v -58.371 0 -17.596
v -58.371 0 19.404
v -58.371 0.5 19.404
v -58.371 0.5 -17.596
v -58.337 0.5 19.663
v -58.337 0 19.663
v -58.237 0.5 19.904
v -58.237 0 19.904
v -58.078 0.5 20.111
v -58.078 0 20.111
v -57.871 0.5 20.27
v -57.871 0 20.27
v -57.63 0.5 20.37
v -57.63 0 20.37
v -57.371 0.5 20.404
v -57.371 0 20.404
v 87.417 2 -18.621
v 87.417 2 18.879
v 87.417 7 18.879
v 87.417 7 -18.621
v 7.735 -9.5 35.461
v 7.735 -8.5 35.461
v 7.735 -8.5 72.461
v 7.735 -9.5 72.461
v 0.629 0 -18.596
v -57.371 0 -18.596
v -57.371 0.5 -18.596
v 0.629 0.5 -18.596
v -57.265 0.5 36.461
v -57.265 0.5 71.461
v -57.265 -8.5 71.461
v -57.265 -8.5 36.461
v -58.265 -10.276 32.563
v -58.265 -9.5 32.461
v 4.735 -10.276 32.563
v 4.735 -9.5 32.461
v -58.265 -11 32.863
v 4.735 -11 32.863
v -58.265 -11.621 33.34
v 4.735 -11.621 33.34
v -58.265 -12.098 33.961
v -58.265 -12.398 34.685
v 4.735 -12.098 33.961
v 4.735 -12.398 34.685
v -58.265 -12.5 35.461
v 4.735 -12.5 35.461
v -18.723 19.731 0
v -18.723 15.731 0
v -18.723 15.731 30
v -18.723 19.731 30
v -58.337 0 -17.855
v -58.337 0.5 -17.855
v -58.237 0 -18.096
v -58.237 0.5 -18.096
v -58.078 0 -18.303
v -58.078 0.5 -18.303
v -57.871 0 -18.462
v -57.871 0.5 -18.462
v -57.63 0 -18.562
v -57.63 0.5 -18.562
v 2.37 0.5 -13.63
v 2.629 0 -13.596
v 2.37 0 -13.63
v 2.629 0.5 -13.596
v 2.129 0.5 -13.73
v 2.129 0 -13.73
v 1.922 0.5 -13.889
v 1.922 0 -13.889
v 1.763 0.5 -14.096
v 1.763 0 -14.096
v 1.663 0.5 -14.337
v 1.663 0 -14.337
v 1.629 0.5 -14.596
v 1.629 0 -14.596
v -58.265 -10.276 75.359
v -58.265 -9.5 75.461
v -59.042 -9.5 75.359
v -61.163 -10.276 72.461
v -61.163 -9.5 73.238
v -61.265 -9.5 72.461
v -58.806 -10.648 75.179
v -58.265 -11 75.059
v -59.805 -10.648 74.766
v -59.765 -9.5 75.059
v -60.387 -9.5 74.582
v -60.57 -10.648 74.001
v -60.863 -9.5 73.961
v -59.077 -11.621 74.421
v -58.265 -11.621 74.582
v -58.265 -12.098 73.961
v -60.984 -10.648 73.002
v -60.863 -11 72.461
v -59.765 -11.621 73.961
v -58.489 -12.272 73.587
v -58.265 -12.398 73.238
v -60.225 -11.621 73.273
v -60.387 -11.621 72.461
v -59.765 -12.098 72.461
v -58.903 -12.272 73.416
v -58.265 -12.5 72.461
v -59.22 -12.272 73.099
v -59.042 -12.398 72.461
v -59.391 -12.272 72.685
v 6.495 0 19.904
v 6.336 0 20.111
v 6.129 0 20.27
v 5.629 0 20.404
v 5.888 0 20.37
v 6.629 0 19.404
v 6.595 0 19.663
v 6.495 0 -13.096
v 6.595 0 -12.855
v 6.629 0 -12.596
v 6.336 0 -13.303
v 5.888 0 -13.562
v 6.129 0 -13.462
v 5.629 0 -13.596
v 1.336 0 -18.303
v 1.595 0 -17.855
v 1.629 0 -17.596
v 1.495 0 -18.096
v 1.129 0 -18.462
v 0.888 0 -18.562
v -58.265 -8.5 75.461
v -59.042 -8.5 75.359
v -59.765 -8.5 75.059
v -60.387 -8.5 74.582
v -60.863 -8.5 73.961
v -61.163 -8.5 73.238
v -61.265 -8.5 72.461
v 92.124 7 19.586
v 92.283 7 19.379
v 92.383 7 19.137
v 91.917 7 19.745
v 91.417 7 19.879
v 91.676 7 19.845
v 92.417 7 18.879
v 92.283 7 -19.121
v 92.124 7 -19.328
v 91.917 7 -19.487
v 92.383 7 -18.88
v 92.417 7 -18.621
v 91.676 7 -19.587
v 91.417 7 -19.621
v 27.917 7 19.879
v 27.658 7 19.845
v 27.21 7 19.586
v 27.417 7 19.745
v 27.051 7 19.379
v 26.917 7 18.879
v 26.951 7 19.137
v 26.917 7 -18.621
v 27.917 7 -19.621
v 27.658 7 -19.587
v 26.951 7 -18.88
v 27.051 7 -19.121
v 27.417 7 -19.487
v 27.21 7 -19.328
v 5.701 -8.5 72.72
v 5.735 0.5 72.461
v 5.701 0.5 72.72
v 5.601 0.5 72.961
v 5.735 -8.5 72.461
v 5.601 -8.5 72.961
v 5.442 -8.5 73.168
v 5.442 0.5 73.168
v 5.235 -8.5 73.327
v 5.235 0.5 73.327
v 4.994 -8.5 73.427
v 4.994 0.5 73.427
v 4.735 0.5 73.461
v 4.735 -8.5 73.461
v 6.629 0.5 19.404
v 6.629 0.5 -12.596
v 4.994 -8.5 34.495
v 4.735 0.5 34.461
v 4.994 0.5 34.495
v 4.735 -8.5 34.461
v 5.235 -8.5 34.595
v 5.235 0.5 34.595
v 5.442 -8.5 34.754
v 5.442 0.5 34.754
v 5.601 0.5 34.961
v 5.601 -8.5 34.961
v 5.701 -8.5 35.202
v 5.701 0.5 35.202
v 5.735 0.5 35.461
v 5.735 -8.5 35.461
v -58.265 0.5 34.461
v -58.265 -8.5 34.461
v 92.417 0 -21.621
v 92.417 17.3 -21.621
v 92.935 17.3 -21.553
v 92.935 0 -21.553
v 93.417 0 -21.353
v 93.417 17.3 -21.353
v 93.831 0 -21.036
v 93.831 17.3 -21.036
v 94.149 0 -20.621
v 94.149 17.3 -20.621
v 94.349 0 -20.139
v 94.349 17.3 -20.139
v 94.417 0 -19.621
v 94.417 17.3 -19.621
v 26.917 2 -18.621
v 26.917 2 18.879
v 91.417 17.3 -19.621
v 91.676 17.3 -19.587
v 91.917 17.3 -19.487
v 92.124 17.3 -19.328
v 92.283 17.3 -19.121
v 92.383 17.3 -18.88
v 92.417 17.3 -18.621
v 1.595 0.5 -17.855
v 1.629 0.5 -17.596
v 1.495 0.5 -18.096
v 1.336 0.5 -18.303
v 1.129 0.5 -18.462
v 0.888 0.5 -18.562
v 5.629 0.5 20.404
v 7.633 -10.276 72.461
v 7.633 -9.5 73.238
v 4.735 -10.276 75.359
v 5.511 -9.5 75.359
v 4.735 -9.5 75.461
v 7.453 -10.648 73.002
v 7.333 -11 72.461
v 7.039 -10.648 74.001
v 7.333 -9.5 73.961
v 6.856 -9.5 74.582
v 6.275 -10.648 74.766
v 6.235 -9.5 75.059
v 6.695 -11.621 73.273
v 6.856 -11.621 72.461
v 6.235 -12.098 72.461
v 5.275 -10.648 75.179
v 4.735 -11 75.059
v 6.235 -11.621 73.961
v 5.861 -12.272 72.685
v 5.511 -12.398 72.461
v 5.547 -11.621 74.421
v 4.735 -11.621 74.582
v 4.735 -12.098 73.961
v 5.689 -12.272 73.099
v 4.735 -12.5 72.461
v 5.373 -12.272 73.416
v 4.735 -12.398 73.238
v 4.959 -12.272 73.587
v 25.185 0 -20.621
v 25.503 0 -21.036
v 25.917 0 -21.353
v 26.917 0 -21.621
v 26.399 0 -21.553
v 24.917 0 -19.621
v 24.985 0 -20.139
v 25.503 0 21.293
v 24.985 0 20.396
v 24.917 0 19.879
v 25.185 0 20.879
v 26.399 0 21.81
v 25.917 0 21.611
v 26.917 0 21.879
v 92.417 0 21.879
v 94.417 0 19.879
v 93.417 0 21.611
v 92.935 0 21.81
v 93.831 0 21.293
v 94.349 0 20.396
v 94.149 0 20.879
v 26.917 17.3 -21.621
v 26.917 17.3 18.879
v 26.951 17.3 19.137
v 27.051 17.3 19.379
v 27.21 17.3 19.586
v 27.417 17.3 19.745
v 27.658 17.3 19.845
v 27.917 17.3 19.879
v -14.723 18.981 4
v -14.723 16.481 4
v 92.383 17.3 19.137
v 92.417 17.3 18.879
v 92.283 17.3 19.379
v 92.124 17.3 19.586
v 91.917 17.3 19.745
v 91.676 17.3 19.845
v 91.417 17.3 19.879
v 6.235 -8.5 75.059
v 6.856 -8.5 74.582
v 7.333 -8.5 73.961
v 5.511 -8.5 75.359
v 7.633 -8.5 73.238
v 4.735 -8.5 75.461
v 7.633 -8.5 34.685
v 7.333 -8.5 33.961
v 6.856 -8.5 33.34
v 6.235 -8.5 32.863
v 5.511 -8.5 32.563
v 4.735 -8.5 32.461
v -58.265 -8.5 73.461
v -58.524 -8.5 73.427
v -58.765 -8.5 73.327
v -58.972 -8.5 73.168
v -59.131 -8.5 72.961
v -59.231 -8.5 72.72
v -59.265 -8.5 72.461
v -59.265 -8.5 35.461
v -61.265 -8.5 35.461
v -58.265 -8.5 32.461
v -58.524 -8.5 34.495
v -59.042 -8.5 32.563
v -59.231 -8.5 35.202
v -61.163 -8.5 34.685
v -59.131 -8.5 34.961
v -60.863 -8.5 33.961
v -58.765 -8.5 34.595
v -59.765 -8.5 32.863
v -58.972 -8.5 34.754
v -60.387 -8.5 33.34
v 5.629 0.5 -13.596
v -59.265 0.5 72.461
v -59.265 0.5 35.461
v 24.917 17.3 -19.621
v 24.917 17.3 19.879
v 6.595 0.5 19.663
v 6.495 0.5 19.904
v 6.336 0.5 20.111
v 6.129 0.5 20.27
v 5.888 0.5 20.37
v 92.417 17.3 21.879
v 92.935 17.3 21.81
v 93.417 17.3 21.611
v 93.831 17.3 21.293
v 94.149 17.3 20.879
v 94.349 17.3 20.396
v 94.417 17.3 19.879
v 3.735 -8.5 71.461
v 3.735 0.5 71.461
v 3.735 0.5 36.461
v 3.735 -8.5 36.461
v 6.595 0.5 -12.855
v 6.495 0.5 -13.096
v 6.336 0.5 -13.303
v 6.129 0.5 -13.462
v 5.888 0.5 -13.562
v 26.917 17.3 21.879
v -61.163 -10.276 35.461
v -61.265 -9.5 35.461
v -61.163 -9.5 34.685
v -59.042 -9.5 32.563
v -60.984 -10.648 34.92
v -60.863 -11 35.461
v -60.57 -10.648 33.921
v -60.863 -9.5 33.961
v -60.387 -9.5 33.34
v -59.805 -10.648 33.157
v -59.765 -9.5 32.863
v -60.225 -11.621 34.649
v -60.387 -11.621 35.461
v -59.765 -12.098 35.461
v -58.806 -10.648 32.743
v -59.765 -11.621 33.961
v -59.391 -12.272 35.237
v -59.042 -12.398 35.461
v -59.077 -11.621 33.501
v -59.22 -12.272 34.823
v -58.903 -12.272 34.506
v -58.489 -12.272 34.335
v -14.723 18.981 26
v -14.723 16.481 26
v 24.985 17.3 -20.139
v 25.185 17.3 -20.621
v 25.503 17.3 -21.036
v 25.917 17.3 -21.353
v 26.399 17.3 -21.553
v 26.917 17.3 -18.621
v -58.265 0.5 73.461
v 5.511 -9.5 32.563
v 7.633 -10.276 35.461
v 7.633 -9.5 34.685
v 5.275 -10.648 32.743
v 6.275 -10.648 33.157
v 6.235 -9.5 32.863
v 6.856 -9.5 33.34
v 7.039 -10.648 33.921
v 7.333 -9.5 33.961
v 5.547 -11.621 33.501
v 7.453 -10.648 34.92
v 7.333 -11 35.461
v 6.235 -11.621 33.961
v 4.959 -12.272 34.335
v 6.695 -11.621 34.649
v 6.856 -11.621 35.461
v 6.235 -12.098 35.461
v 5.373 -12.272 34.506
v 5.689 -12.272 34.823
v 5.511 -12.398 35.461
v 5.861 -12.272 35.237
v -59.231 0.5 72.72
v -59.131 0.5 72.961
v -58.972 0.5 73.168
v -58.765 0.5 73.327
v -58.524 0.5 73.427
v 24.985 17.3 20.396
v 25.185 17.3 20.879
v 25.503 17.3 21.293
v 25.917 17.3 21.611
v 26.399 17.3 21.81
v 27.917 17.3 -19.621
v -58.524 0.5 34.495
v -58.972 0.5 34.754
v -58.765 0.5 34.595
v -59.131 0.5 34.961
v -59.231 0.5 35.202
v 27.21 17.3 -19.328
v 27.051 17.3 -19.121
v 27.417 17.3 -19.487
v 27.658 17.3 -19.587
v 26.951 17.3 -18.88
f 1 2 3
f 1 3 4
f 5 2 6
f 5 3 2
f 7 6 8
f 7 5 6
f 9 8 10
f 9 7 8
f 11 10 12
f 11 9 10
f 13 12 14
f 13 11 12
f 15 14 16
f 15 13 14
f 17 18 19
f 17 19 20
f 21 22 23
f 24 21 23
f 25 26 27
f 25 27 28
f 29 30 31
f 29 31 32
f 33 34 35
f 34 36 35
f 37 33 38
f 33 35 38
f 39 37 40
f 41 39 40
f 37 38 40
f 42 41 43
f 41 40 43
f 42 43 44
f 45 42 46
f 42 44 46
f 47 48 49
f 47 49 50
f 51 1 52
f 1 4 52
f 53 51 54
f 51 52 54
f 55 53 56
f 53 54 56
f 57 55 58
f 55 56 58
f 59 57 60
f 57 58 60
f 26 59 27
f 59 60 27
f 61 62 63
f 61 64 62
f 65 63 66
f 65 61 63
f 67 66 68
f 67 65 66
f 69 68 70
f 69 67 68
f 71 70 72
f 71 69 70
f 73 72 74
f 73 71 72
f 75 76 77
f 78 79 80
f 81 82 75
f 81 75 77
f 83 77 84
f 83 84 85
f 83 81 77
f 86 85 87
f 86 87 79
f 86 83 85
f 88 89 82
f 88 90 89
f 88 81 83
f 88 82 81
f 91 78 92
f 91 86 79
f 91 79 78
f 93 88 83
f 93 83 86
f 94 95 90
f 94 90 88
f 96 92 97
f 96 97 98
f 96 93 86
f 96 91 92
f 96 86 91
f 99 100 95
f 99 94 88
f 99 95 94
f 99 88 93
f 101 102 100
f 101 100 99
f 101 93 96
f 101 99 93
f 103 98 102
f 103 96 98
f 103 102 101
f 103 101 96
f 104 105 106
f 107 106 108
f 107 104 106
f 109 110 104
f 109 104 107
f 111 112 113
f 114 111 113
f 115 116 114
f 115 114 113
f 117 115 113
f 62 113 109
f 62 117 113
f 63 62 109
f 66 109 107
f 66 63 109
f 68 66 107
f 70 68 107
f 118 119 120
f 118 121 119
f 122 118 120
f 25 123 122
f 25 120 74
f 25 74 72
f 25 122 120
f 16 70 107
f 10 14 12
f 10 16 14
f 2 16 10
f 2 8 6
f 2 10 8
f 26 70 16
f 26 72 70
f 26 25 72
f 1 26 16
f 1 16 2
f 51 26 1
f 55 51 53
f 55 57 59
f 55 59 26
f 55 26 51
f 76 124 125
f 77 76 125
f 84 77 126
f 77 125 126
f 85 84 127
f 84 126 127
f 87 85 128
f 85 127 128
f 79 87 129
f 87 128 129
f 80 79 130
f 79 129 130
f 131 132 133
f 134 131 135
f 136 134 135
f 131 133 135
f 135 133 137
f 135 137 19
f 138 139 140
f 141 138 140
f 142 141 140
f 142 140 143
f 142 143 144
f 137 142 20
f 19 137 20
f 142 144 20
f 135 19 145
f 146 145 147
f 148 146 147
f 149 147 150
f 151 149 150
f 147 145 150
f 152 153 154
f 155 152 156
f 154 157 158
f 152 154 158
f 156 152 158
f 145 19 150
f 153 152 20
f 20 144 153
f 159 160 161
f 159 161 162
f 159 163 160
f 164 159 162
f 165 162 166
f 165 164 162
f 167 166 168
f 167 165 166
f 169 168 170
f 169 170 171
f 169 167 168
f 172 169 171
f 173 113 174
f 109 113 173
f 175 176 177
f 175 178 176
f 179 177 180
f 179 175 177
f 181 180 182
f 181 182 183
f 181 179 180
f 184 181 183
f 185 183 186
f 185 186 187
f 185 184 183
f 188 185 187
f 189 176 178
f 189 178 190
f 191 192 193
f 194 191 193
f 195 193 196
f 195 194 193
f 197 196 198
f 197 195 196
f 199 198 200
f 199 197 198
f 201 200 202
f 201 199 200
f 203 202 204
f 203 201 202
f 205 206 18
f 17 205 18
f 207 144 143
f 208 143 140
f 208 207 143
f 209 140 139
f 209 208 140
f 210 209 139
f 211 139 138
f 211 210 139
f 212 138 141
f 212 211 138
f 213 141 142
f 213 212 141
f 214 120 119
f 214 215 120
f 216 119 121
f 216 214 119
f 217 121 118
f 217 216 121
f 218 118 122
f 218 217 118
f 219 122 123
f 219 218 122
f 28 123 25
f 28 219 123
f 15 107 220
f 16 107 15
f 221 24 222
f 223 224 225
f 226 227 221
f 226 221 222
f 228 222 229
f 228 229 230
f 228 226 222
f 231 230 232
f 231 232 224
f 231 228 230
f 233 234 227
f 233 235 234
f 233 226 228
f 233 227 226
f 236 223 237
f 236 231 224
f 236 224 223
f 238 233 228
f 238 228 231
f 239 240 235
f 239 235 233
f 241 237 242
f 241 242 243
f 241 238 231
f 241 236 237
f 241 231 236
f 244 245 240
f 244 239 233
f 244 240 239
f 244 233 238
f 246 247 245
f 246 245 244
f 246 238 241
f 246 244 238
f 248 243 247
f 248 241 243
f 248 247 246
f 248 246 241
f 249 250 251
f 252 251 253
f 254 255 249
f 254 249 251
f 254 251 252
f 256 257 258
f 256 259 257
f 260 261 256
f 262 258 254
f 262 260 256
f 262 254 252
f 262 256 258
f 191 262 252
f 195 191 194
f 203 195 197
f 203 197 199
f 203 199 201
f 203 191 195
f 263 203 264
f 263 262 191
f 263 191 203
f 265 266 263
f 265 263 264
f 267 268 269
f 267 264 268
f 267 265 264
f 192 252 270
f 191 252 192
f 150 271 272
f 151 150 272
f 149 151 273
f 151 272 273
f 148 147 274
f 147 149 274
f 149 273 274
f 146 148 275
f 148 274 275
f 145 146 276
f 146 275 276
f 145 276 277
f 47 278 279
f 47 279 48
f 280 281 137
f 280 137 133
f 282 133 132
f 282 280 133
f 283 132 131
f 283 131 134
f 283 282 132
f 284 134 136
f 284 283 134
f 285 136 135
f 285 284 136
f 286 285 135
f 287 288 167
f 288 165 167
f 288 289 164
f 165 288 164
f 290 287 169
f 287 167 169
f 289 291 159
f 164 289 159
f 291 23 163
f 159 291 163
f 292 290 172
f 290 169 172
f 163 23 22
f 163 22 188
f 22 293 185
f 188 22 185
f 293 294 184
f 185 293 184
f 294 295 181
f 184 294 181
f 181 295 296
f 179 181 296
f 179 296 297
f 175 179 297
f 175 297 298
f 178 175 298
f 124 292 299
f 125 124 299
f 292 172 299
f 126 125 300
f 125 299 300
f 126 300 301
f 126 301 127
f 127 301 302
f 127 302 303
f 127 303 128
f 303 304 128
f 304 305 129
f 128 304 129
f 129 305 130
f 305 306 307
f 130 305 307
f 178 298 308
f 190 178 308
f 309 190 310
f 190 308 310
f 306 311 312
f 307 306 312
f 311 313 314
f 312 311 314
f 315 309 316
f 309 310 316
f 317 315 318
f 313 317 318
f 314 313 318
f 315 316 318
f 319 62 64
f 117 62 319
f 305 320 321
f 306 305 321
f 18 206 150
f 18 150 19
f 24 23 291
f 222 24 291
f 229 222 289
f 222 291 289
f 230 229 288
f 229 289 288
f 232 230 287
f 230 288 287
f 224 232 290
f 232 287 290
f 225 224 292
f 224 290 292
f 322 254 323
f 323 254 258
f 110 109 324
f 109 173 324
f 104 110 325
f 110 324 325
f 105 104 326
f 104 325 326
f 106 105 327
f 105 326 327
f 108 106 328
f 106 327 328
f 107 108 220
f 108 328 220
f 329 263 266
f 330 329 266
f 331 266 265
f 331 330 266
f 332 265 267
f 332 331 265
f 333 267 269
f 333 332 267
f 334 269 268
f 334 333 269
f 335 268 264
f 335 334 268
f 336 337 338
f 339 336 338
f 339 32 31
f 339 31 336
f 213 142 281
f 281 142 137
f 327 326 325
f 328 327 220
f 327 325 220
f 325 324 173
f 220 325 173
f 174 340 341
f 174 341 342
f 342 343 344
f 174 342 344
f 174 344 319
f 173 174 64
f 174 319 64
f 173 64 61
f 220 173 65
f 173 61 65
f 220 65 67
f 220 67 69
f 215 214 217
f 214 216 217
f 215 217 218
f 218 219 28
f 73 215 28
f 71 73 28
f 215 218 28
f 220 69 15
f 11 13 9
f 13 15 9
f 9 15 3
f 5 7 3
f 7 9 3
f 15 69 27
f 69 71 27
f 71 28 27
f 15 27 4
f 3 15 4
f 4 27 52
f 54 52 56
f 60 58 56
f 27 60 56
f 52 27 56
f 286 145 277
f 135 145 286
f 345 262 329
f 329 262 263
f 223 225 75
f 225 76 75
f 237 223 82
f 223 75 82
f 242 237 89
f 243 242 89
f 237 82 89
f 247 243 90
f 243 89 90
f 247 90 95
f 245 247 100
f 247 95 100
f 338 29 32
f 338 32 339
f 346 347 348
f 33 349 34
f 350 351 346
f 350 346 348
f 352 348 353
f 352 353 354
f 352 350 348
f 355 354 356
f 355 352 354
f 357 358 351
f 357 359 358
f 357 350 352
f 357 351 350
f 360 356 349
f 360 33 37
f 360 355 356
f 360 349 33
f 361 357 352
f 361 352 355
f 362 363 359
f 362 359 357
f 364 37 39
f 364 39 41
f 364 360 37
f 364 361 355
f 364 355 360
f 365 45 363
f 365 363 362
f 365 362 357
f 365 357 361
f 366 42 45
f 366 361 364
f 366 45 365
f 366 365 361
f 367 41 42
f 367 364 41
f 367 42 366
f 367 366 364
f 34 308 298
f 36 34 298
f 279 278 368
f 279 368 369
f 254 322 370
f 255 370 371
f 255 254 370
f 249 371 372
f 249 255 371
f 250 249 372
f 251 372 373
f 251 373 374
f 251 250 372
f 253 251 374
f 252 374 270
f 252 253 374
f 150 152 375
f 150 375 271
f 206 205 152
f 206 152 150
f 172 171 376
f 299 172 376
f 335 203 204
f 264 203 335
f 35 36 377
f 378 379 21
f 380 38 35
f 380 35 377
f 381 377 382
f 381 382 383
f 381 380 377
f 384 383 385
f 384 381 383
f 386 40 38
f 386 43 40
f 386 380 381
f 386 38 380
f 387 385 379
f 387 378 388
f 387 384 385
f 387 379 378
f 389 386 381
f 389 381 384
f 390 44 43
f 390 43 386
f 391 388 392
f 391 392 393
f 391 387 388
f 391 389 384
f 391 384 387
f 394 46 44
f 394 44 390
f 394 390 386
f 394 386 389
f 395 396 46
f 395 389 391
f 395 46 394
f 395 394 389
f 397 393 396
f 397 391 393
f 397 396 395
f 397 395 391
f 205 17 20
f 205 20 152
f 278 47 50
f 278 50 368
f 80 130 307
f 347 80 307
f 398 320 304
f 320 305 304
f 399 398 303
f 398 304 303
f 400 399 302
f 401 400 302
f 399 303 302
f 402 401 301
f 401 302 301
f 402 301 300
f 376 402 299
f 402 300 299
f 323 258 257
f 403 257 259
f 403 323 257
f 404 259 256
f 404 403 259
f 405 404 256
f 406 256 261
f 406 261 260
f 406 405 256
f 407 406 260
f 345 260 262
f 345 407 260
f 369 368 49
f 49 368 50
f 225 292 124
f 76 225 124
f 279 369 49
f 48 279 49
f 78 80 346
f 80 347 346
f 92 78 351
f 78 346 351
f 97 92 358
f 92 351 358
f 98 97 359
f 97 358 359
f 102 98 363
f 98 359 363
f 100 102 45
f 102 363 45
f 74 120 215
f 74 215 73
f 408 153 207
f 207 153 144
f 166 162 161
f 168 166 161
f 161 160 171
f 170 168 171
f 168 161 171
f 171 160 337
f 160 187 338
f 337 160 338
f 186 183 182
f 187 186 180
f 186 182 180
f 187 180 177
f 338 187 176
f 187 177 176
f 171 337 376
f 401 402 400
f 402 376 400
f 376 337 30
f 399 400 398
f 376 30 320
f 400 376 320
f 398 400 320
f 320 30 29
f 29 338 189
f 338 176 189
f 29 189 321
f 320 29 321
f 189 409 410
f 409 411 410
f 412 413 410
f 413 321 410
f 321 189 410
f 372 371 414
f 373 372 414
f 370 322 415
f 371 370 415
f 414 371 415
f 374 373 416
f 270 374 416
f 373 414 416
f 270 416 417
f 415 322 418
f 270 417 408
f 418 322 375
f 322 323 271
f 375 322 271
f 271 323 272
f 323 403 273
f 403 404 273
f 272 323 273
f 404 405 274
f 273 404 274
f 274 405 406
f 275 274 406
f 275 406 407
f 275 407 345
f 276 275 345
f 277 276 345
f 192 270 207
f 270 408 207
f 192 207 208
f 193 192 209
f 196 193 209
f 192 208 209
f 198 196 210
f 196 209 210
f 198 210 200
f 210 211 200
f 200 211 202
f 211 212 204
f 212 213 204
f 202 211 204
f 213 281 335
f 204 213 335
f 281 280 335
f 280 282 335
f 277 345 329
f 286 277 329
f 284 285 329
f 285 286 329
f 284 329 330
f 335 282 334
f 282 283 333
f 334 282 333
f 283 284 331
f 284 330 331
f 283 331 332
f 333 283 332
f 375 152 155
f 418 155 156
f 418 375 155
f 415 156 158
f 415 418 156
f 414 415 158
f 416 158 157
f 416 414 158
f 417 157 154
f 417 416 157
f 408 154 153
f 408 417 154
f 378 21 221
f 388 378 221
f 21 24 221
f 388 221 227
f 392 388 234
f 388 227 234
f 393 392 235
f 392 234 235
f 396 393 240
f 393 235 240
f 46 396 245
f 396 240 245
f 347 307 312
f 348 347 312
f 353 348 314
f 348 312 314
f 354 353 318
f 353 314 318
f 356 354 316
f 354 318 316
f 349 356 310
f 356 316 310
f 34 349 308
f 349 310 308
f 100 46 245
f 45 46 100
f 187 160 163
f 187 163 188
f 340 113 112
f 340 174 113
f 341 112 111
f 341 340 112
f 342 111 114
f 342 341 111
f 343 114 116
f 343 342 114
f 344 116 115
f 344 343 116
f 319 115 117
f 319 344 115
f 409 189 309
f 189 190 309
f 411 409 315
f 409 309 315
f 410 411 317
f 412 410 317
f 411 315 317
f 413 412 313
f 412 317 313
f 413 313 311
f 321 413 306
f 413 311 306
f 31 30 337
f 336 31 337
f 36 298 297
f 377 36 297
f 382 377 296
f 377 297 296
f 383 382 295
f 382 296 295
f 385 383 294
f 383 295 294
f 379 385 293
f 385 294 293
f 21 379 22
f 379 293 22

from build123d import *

# Parameters (mm, degrees)
BOSS_EXTRUDE1_DEPTH  = 0.5
FILLET2_R            = 1
FILLET3_R            = 1
FILLET4_R            = 1
FILLET5_R            = 1
SKETCH3_W            = 69.5
SKETCH3_H            = 43.5
SKETCH3_W_2          = 65.5
SKETCH3_H_2          = 39.5
BOSS_EXTRUDE2_DEPTH  = 17.3
SKETCH5_W            = 69.5
SKETCH5_H            = 43.5
BOSS_EXTRUDE3_DEPTH  = 2
FILLET6_R            = 1
FILLET7_R            = 1
FILLET8_R            = 1
FILLET9_R            = 1
BOSS_EXTRUDE5_DEPTH  = 9
FILLET12_R           = 1
FILLET13_R           = 1
BOSS_EXTRUDE6_DEPTH  = 4
SKETCH9_W            = 61
SKETCH9_H            = 35
BOSS_EXTRUDE7_DEPTH  = 9
FILLET15_R           = 3
BOSS_EXTRUDE8_DEPTH  = 30
BOSS_EXTRUDE9_REACH  = 127.091
FILLET16_R           = 2
BOSS_EXTRUDE10_DEPTH = 5


with BuildPart() as part:
    # Sketch1 → Boss-Extrude1 (new body)
    with BuildSketch(Plane(origin=(0, 0, 0), x_dir=(1, 0, 0), z_dir=(0, 1, 0))):
        Polygon((-58.370860927, -20.40397351), (-58.370860927, 18.59602649), (1.629139073, 18.59602649), (1.629139073, 13.59602649), (6.629139073, 13.59602649), (6.629139073, -20.40397351), align=None)
    extrude(amount=BOSS_EXTRUDE1_DEPTH)

    # Fillet2
    fillet2_edges = [part.edges().sort_by_distance(p)[0] for p in [
        (6.629139073, 0.25, 20.40397351),
    ]]
    fillet(fillet2_edges, radius=FILLET2_R)

    # Fillet3
    fillet3_edges = [part.edges().sort_by_distance(p)[0] for p in [
        (1.629139073, 0.25, -18.59602649),
        (1.629139073, 0.25, -13.59602649),
        (6.629139073, 0.25, -13.59602649),
    ]]
    fillet(fillet3_edges, radius=FILLET3_R)

    # Fillet4
    fillet4_edges = [part.edges().sort_by_distance(p)[0] for p in [
        (-58.370860927, 0.25, -18.59602649),
    ]]
    fillet(fillet4_edges, radius=FILLET4_R)

    # Fillet5
    fillet5_edges = [part.edges().sort_by_distance(p)[0] for p in [
        (-58.370860927, 0.25, 20.40397351),
    ]]
    fillet(fillet5_edges, radius=FILLET5_R)


with BuildPart() as body_2:
    # Sketch3 → Boss-Extrude2 (new body)
    with BuildSketch(Plane.XZ):
        with Locations((59.667093339, 0.128619439)):
            Rectangle(SKETCH3_W, SKETCH3_H)
        with Locations((59.667093339, 0.128619439)):
            Rectangle(SKETCH3_W_2, SKETCH3_H_2, mode=Mode.SUBTRACT)
    extrude(amount=-BOSS_EXTRUDE2_DEPTH)

    # Sketch5 → Boss-Extrude3 (add)
    with BuildSketch(Plane.XZ):
        with Locations((59.667093339, 0.128619439)):
            Rectangle(SKETCH5_W, SKETCH5_H)
    extrude(amount=-BOSS_EXTRUDE3_DEPTH)

    # Fillet6
    fillet6_edges = [body_2.edges().sort_by_distance(p)[0] for p in [
        (26.917093339, 9.65, 19.878619439),
    ]]
    fillet(fillet6_edges, radius=FILLET6_R)

    # Fillet7
    fillet7_edges = [body_2.edges().sort_by_distance(p)[0] for p in [
        (26.917093339, 9.65, -19.621380561),
    ]]
    fillet(fillet7_edges, radius=FILLET7_R)

    # Fillet8
    fillet8_edges = [body_2.edges().sort_by_distance(p)[0] for p in [
        (92.417093339, 9.65, -19.621380561),
    ]]
    fillet(fillet8_edges, radius=FILLET8_R)

    # Fillet9
    fillet9_edges = [body_2.edges().sort_by_distance(p)[0] for p in [
        (92.417093339, 9.65, 19.878619439),
    ]]
    fillet(fillet9_edges, radius=FILLET9_R)

    # Fillet16
    fillet16_edges = [body_2.edges().sort_by_distance(p)[0] for p in [
        (94.417093339, 8.65, 21.878619439),
        (94.417093339, 8.65, -21.621380561),
        (24.917093339, 8.65, -21.621380561),
        (24.917093339, 8.65, 21.878619439),
    ]]
    fillet(fillet16_edges, radius=FILLET16_R)

    # Sketch21 → Boss-Extrude10 (add)
    with BuildSketch(Plane(origin=(0, 2, 0), x_dir=(1, 0, 0), z_dir=(0, 1, 0))):
        with BuildLine():
            Line((26.917093339, -18.878619439), (87.417093339, -18.878619439))
            Line((87.417093339, -18.878619439), (87.417093339, 18.621380561))
            Line((87.417093339, 18.621380561), (26.917093339, 18.621380561))
            ThreePointArc((26.917093339, 18.621380561), (27.209986558, 19.328487343), (27.917093339, 19.621380561))
            Line((27.917093339, 19.621380561), (91.417093339, 19.621380561))
            ThreePointArc((91.417093339, 19.621380561), (92.12420012, 19.328487343), (92.417093339, 18.621380561))
            Line((92.417093339, 18.621380561), (92.417093339, -18.878619439))
            ThreePointArc((92.417093339, -18.878619439), (92.12420012, -19.58572622), (91.417093339, -19.878619439))
            Line((91.417093339, -19.878619439), (27.917093339, -19.878619439))
            ThreePointArc((27.917093339, -19.878619439), (27.209986558, -19.58572622), (26.917093339, -18.878619439))
        make_face()
    extrude(amount=BOSS_EXTRUDE10_DEPTH)


with BuildPart() as body_3:
    # Sketch7 → Boss-Extrude5 (new body)
    with BuildSketch(Plane(origin=(-22.905465396, 0.5, 42.53872145), x_dir=(1, 0, 0), z_dir=(0, 1, 0))):
        Polygon((-36.359783771, -30.922325969), (-36.359783771, 8.077674031), (23.640216229, 8.077674031), (28.640216229, 8.077674031), (28.640216229, 3.077674031), (28.640216229, -30.922325969), align=None)
    extrude(amount=-BOSS_EXTRUDE5_DEPTH)

    # Fillet12
    fillet12_edges = [body_3.edges().sort_by_distance(p)[0] for p in [
        (5.734750833, -4, 34.461047419),
        (5.734750833, -4, 73.461047419),
    ]]
    fillet(fillet12_edges, radius=FILLET12_R)

    # Fillet13
    fillet13_edges = [body_3.edges().sort_by_distance(p)[0] for p in [
        (-59.265249167, -4, 73.461047419),
        (-59.265249167, -4, 34.461047419),
    ]]
    fillet(fillet13_edges, radius=FILLET13_R)

    # Sketch8 → Boss-Extrude6 (add)
    with BuildSketch(Plane(origin=(0, -8.5, 0), x_dir=(-1, 0, 0), z_dir=(0, -1, 0))):
        with BuildLine():
            Line((58.265249167, -32.461047419), (-4.734750833, -32.461047419))
            ThreePointArc((-4.734750833, -32.461047419), (-6.856071177, -33.339727075), (-7.734750833, -35.461047419))
            Line((-7.734750833, -35.461047419), (-7.734750833, -72.461047419))
            ThreePointArc((-7.734750833, -72.461047419), (-6.856071177, -74.582367762), (-4.734750833, -75.461047419))
            Line((-4.734750833, -75.461047419), (58.265249167, -75.461047419))
            ThreePointArc((58.265249167, -75.461047419), (60.38656951, -74.582367762), (61.265249167, -72.461047419))
            Line((61.265249167, -72.461047419), (61.265249167, -35.461047419))
            ThreePointArc((61.265249167, -35.461047419), (60.38656951, -33.339727075), (58.265249167, -32.461047419))
        make_face()
    extrude(amount=BOSS_EXTRUDE6_DEPTH)


with BuildPart() as body_4:
    # Sketch9 → Boss-Extrude7 (new body)
    with BuildSketch(Plane(origin=(0, 0.5, 0), x_dir=(1, 0, 0), z_dir=(0, 1, 0))):
        with Locations((-26.765249167, -53.961047419)):
            Rectangle(SKETCH9_W, SKETCH9_H)
    extrude(amount=-BOSS_EXTRUDE7_DEPTH)


with BuildPart() as body_3_1:
    add(body_3.part)

    # Combine1: cut body 4
    add(body_4.part, mode=Mode.SUBTRACT)

    # Fillet15
    fillet15_edges = [body_3_1.edges().sort_by_distance(p)[0] for p in [
        (-60.38656951, -12.5, 33.339727075),
        (-26.765249167, -12.5, 32.461047419),
        (6.856071177, -12.5, 33.339727075),
        (7.734750833, -12.5, 53.961047419),
        (6.856071177, -12.5, 74.582367762),
        (-26.765249167, -12.5, 75.461047419),
        (-60.38656951, -12.5, 74.582367762),
        (-61.265249167, -12.5, 53.961047419),
    ]]
    fillet(fillet15_edges, radius=FILLET15_R)


with BuildPart() as body_4_2:
    # Sketch19 → Boss-Extrude8 (new body)
    with BuildSketch(Plane.XY):
        Polygon((-18.723200044, 15.730603156), (-18.723200044, 19.730603156), (-14.723200044, 18.980603156), (-14.723200044, 16.480603156), align=None)
    extrude(amount=BOSS_EXTRUDE8_DEPTH)


with BuildPart() as body_5:
    # Boss-Extrude9: up to this plane
    boss_extrude9_end = Plane(origin=(-18.723200044, 15.730603156, 30), z_dir=(-0.1842885350501855, 0.982872186934322, 0))
    # Sketch20 → Boss-Extrude9 (new, up to the surface)
    with BuildSketch(Plane(origin=(0, 19.730603156, 0), x_dir=(-1, 0, 0), z_dir=(0, 1, 0)), mode=Mode.PRIVATE) as boss_extrude9_sk1:
        Polygon((18.723200044, 30), (14.723200044, 30), (14.723200044, 26), align=None)
    boss_extrude9_tool1 = split(extrude(boss_extrude9_sk1.sketch, amount=-BOSS_EXTRUDE9_REACH, mode=Mode.PRIVATE), bisect_by=boss_extrude9_end, keep=Keep.BOTH, mode=Mode.PRIVATE)
    add(boss_extrude9_tool1.solids().sort_by_distance((-16.056533, 19.730603, 28.666667))[0])
    # Sketch20 → Boss-Extrude9 (new, up to the surface)
    with BuildSketch(Plane(origin=(0, 19.730603156, 0), x_dir=(-1, 0, 0), z_dir=(0, 1, 0)), mode=Mode.PRIVATE) as boss_extrude9_sk2:
        Polygon((14.723200044, 0), (14.723200044, 4), (18.723200044, 0), align=None)
    boss_extrude9_tool2 = split(extrude(boss_extrude9_sk2.sketch, amount=-BOSS_EXTRUDE9_REACH, mode=Mode.PRIVATE), bisect_by=boss_extrude9_end, keep=Keep.BOTH, mode=Mode.PRIVATE)
    add(boss_extrude9_tool2.solids().sort_by_distance((-16.056533, 19.730603, 1.333333))[0])


with BuildPart() as body_4_2_1:
    add(body_4_2.part)

    # Combine2: cut body 5
    add(body_5.part, mode=Mode.SUBTRACT)


solid = Compound([part.part, body_2.part, body_3_1.part, body_4_2_1.part])
